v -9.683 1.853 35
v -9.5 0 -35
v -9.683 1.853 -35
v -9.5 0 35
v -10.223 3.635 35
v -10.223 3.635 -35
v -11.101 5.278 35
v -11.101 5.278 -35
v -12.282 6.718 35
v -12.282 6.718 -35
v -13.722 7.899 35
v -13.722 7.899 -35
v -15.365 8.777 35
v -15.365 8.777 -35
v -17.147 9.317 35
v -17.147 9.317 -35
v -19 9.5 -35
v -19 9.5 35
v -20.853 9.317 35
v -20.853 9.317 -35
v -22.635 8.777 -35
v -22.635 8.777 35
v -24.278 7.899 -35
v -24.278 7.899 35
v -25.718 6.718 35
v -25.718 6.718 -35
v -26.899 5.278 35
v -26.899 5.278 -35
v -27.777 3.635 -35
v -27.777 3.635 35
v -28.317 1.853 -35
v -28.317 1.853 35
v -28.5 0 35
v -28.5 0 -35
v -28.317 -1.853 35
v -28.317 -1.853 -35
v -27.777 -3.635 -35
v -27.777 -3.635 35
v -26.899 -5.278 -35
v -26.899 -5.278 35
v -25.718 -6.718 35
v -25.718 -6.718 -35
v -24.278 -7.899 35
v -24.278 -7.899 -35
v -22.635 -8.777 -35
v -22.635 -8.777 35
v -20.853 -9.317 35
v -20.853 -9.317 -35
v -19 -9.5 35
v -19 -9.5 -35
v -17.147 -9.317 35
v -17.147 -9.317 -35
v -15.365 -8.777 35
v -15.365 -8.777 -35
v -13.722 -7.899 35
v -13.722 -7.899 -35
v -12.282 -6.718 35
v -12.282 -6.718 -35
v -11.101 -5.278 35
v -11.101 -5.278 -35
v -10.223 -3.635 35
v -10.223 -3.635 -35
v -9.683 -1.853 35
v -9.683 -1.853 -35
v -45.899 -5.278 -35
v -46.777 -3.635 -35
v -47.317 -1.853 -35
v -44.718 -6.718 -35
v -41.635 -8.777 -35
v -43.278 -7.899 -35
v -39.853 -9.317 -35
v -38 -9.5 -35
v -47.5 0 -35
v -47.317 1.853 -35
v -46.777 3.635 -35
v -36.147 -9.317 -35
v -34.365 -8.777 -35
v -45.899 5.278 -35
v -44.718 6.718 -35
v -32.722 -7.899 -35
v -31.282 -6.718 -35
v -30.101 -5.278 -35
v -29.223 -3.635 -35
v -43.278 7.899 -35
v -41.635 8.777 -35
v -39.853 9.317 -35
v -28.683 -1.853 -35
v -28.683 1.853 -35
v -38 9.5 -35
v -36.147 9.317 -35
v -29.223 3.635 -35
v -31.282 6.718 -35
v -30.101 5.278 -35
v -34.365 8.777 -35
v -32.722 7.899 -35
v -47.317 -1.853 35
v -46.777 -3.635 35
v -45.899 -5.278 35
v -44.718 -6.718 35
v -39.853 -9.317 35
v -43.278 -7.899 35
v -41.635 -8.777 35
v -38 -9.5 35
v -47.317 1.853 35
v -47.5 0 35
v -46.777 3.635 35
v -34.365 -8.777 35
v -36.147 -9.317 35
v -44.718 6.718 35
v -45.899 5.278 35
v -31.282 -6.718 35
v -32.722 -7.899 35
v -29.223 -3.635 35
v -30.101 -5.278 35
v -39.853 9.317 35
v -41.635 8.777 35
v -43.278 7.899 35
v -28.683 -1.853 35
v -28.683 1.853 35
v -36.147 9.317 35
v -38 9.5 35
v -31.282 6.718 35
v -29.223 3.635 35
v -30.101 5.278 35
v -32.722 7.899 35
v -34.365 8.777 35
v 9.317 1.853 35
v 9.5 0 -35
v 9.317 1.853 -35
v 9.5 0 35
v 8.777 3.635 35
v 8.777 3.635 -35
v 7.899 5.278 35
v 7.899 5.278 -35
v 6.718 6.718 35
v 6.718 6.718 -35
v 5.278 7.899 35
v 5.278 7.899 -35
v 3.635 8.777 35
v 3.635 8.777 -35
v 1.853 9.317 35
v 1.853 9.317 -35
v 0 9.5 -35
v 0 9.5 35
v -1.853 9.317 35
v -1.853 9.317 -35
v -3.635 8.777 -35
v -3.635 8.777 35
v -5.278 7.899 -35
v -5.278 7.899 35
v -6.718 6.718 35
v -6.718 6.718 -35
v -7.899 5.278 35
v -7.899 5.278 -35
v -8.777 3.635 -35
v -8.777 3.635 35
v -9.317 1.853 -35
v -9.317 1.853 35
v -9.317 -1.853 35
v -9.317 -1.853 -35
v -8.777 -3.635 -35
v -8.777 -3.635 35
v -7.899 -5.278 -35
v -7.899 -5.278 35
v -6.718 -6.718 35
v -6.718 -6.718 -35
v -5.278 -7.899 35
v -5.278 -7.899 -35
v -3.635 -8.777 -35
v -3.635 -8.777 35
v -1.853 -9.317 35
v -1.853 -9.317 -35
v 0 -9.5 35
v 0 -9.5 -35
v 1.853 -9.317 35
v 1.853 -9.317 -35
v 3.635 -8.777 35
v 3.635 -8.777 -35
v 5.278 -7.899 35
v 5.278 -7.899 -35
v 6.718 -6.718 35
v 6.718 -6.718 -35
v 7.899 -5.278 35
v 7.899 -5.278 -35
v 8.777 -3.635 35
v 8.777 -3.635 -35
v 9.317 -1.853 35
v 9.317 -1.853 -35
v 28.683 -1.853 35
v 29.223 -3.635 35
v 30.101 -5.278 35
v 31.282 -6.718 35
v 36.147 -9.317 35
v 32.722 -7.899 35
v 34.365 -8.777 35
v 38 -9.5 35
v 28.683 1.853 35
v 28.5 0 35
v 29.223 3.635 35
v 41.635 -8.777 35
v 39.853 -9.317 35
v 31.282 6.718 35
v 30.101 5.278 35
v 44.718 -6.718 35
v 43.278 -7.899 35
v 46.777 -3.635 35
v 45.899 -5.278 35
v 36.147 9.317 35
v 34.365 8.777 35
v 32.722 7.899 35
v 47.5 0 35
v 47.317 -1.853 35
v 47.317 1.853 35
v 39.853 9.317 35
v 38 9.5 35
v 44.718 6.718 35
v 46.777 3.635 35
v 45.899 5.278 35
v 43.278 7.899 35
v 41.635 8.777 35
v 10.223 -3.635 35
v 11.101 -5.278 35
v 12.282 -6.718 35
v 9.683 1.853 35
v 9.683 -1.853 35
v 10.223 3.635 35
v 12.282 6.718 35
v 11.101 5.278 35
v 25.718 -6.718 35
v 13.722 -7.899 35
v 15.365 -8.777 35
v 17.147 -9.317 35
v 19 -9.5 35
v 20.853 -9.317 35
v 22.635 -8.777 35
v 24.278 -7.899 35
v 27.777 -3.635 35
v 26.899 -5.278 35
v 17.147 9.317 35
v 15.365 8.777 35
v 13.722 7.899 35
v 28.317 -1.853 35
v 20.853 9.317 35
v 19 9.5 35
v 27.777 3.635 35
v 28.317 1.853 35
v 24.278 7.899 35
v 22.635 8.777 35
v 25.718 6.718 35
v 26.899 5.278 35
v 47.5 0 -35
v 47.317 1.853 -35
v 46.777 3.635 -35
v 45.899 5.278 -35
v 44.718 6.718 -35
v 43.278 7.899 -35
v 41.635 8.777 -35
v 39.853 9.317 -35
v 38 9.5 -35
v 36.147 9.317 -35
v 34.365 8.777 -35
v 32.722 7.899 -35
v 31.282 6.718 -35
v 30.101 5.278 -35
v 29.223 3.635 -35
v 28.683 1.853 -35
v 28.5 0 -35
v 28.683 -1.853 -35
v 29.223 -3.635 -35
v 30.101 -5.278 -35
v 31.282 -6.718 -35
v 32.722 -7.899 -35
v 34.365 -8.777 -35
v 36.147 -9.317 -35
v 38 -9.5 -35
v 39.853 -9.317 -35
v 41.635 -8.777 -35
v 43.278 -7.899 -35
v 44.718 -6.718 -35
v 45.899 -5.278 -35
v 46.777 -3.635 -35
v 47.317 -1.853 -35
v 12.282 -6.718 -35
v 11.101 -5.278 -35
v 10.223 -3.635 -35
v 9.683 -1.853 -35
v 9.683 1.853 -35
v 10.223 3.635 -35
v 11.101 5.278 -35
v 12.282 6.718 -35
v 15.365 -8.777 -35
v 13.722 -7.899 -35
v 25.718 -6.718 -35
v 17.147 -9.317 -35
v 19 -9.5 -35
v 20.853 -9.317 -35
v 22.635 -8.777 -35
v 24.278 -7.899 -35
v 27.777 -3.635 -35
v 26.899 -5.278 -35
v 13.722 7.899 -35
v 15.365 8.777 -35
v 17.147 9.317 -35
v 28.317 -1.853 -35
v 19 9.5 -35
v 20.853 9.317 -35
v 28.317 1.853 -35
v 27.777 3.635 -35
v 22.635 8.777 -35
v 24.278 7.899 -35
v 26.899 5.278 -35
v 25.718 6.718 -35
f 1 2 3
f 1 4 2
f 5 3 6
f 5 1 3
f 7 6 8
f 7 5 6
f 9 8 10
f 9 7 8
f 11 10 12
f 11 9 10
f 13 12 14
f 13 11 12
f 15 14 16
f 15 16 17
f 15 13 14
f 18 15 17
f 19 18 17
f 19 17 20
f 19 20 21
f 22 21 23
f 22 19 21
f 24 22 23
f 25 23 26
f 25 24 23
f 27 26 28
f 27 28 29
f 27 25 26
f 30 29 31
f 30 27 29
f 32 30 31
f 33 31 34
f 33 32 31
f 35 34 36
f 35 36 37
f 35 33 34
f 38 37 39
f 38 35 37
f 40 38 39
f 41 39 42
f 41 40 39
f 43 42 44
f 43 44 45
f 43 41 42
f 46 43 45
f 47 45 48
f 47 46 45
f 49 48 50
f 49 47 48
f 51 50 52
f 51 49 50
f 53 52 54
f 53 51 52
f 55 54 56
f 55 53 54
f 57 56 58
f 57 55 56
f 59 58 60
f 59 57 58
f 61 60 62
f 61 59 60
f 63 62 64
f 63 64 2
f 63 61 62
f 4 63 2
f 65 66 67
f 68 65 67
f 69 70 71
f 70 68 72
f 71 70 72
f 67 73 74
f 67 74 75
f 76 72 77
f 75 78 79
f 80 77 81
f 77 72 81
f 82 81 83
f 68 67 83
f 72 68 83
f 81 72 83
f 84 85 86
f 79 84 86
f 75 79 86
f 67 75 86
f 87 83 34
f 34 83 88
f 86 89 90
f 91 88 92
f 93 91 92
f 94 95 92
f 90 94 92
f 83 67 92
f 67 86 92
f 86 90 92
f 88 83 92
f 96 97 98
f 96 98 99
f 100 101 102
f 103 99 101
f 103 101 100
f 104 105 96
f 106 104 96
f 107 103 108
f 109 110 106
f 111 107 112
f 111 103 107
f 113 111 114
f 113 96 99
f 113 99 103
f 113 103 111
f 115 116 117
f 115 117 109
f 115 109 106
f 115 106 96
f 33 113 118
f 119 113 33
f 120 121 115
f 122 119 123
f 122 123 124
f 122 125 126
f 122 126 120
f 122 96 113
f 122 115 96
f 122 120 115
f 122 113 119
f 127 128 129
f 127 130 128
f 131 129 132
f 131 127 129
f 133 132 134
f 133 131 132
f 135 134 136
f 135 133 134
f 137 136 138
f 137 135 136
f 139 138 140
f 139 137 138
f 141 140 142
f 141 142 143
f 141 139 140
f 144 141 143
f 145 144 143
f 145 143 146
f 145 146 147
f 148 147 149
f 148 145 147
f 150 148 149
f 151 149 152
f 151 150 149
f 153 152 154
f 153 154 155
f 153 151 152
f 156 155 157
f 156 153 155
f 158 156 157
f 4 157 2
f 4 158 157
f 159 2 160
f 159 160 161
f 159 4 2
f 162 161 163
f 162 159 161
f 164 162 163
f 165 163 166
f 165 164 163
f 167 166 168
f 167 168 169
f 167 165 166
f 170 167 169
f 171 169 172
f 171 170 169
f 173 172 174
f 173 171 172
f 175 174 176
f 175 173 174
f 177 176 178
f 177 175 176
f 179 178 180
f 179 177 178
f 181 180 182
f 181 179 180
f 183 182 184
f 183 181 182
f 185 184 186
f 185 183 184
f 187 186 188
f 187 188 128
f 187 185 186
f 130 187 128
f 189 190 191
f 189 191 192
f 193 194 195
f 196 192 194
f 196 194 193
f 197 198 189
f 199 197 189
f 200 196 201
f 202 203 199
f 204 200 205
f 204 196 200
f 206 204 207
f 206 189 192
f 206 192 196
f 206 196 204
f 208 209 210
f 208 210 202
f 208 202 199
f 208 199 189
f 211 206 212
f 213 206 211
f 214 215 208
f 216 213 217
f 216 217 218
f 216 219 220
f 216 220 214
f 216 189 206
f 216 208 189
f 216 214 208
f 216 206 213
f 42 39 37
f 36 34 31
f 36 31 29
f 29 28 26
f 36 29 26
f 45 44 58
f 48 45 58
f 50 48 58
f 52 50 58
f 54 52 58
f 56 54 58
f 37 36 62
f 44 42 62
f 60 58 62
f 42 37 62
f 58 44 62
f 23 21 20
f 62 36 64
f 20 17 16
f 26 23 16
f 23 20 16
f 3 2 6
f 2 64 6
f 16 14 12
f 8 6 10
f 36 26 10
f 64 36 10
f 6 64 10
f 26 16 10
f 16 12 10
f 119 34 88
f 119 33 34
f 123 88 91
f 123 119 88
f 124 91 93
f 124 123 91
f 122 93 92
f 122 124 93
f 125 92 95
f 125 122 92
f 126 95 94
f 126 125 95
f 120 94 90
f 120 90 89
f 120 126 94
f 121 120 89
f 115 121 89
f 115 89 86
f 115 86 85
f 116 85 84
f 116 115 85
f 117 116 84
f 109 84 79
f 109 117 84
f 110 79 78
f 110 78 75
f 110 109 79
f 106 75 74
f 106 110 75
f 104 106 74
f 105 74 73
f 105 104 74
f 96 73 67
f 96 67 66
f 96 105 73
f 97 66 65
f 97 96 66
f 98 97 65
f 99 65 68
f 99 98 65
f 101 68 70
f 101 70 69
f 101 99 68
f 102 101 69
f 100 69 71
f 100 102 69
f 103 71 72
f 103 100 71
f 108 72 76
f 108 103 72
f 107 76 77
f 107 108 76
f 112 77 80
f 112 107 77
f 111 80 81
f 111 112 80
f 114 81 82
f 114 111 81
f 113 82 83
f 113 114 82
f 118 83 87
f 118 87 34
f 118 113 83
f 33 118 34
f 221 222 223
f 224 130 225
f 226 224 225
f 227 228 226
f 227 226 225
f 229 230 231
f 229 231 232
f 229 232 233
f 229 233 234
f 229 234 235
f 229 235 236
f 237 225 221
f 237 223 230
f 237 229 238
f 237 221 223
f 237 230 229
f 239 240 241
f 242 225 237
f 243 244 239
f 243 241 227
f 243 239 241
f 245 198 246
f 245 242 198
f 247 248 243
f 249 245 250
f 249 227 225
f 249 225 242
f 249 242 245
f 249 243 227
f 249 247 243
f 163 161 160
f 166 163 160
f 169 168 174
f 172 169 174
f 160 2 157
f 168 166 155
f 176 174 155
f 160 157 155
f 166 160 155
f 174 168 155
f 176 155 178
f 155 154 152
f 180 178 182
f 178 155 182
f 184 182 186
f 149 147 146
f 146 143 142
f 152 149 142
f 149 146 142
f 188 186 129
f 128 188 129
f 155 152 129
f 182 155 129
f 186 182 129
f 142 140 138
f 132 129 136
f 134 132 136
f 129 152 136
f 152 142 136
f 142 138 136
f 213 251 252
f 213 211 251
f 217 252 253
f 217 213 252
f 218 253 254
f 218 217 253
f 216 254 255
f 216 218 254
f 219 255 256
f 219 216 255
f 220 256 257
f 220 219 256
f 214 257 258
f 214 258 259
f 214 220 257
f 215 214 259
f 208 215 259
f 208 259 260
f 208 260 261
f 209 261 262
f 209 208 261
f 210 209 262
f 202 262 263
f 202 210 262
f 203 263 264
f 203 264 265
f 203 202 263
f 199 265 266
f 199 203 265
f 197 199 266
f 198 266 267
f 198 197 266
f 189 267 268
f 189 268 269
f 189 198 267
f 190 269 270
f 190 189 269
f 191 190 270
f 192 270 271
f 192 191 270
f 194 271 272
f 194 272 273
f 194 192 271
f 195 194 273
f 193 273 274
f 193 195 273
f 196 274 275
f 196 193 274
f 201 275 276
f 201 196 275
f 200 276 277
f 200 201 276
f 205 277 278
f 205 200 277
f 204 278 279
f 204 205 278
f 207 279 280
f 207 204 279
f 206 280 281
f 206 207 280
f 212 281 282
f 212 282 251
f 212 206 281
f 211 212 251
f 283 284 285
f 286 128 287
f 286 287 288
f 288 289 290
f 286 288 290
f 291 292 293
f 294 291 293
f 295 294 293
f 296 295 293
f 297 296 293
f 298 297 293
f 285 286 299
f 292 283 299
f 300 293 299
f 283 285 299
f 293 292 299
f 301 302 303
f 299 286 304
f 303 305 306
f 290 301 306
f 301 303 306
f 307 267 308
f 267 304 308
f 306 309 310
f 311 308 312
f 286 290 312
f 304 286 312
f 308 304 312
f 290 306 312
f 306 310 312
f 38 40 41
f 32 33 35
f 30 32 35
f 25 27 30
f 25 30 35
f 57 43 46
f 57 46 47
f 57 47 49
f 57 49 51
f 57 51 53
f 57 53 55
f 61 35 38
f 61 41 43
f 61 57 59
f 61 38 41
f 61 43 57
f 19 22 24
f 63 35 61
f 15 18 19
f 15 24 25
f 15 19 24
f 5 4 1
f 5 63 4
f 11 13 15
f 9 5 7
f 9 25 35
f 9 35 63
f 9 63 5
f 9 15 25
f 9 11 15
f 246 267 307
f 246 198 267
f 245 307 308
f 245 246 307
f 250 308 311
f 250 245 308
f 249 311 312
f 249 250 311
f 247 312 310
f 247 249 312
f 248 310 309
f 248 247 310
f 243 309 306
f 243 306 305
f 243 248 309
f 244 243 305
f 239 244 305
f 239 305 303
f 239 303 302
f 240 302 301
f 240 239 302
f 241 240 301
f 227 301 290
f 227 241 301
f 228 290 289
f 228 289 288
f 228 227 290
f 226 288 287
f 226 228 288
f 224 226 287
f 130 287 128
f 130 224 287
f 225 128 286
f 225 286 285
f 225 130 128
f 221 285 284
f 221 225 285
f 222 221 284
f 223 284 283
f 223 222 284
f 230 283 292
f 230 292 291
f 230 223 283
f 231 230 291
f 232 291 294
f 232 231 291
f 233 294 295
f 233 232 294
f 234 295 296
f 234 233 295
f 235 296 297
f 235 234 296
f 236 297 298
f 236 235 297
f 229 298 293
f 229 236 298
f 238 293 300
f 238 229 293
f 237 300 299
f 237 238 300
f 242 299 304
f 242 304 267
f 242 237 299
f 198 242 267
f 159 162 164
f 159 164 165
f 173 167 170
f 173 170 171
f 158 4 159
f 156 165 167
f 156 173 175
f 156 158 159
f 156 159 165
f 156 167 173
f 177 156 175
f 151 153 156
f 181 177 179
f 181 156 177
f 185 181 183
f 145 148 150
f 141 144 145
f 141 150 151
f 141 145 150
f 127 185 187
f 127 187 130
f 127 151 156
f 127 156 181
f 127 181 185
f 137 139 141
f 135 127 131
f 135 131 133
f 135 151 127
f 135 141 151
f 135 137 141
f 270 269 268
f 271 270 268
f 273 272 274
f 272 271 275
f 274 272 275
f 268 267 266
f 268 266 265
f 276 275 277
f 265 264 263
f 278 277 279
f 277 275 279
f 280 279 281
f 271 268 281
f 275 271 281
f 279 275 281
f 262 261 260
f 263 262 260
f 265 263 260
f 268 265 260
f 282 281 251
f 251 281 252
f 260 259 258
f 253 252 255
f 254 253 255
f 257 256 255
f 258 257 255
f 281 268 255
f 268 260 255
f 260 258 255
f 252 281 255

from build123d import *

# Parameters (mm, degrees)
BOSS_EXTRUDE1_DEPTH        = 35
BOSS_EXTRUDE1_DEPTH_BACK   = 35
BOSS_EXTRUDE1_2_DEPTH      = 35
BOSS_EXTRUDE1_2_DEPTH_BACK = 35
SKETCH1_R                  = 9.5
BOSS_EXTRUDE1_3_DEPTH      = 35
BOSS_EXTRUDE1_3_DEPTH_BACK = 35
BOSS_EXTRUDE1_4_DEPTH      = 35
BOSS_EXTRUDE1_4_DEPTH_BACK = 35
BOSS_EXTRUDE1_5_DEPTH      = 35
BOSS_EXTRUDE1_5_DEPTH_BACK = 35


with BuildPart() as part:
    # Sketch1 → Boss-Extrude1 (new, two sides: drawn at the far end of the back side and taken through both)
    with BuildSketch(Plane.XY.offset(-BOSS_EXTRUDE1_DEPTH_BACK)):
        with BuildLine():
            ThreePointArc((-9.5, 0), (0, -9.5), (9.5, 0))
            ThreePointArc((9.5, 0), (0, 9.5), (-9.5, 0))
        make_face()
    extrude(amount=BOSS_EXTRUDE1_DEPTH + BOSS_EXTRUDE1_DEPTH_BACK)


with BuildPart() as body_2:
    # Sketch1 → Boss-Extrude1 2 (new, two sides: drawn at the far end of the back side and taken through both)
    with BuildSketch(Plane.XY.offset(-BOSS_EXTRUDE1_2_DEPTH_BACK)):
        with Locations((-38, 0)):
            Circle(SKETCH1_R)
    extrude(amount=BOSS_EXTRUDE1_2_DEPTH + BOSS_EXTRUDE1_2_DEPTH_BACK)


with BuildPart() as body_3:
    # Sketch1 → Boss-Extrude1 3 (new, two sides: drawn at the far end of the back side and taken through both)
    with BuildSketch(Plane.XY.offset(-BOSS_EXTRUDE1_3_DEPTH_BACK)):
        with BuildLine():
            ThreePointArc((-28.5, 0), (-19, -9.5), (-9.5, 0))
            ThreePointArc((-9.5, 0), (-19, 9.5), (-28.5, 0))
        make_face()
    extrude(amount=BOSS_EXTRUDE1_3_DEPTH + BOSS_EXTRUDE1_3_DEPTH_BACK)


with BuildPart() as body_4:
    # Sketch1 → Boss-Extrude1 4 (new, two sides: drawn at the far end of the back side and taken through both)
    with BuildSketch(Plane.XY.offset(-BOSS_EXTRUDE1_4_DEPTH_BACK)):
        with Locations((38, 0)):
            Circle(SKETCH1_R)
    extrude(amount=BOSS_EXTRUDE1_4_DEPTH + BOSS_EXTRUDE1_4_DEPTH_BACK)


with BuildPart() as body_5:
    # Sketch1 → Boss-Extrude1 5 (new, two sides: drawn at the far end of the back side and taken through both)
    with BuildSketch(Plane.XY.offset(-BOSS_EXTRUDE1_5_DEPTH_BACK)):
        with BuildLine():
            ThreePointArc((28.5, 0), (19, 9.5), (9.5, 0))
            ThreePointArc((9.5, 0), (19, -9.5), (28.5, 0))
        make_face()
    extrude(amount=BOSS_EXTRUDE1_5_DEPTH + BOSS_EXTRUDE1_5_DEPTH_BACK)


solid = Compound([part.part, body_2.part, body_3.part, body_4.part, body_5.part])
